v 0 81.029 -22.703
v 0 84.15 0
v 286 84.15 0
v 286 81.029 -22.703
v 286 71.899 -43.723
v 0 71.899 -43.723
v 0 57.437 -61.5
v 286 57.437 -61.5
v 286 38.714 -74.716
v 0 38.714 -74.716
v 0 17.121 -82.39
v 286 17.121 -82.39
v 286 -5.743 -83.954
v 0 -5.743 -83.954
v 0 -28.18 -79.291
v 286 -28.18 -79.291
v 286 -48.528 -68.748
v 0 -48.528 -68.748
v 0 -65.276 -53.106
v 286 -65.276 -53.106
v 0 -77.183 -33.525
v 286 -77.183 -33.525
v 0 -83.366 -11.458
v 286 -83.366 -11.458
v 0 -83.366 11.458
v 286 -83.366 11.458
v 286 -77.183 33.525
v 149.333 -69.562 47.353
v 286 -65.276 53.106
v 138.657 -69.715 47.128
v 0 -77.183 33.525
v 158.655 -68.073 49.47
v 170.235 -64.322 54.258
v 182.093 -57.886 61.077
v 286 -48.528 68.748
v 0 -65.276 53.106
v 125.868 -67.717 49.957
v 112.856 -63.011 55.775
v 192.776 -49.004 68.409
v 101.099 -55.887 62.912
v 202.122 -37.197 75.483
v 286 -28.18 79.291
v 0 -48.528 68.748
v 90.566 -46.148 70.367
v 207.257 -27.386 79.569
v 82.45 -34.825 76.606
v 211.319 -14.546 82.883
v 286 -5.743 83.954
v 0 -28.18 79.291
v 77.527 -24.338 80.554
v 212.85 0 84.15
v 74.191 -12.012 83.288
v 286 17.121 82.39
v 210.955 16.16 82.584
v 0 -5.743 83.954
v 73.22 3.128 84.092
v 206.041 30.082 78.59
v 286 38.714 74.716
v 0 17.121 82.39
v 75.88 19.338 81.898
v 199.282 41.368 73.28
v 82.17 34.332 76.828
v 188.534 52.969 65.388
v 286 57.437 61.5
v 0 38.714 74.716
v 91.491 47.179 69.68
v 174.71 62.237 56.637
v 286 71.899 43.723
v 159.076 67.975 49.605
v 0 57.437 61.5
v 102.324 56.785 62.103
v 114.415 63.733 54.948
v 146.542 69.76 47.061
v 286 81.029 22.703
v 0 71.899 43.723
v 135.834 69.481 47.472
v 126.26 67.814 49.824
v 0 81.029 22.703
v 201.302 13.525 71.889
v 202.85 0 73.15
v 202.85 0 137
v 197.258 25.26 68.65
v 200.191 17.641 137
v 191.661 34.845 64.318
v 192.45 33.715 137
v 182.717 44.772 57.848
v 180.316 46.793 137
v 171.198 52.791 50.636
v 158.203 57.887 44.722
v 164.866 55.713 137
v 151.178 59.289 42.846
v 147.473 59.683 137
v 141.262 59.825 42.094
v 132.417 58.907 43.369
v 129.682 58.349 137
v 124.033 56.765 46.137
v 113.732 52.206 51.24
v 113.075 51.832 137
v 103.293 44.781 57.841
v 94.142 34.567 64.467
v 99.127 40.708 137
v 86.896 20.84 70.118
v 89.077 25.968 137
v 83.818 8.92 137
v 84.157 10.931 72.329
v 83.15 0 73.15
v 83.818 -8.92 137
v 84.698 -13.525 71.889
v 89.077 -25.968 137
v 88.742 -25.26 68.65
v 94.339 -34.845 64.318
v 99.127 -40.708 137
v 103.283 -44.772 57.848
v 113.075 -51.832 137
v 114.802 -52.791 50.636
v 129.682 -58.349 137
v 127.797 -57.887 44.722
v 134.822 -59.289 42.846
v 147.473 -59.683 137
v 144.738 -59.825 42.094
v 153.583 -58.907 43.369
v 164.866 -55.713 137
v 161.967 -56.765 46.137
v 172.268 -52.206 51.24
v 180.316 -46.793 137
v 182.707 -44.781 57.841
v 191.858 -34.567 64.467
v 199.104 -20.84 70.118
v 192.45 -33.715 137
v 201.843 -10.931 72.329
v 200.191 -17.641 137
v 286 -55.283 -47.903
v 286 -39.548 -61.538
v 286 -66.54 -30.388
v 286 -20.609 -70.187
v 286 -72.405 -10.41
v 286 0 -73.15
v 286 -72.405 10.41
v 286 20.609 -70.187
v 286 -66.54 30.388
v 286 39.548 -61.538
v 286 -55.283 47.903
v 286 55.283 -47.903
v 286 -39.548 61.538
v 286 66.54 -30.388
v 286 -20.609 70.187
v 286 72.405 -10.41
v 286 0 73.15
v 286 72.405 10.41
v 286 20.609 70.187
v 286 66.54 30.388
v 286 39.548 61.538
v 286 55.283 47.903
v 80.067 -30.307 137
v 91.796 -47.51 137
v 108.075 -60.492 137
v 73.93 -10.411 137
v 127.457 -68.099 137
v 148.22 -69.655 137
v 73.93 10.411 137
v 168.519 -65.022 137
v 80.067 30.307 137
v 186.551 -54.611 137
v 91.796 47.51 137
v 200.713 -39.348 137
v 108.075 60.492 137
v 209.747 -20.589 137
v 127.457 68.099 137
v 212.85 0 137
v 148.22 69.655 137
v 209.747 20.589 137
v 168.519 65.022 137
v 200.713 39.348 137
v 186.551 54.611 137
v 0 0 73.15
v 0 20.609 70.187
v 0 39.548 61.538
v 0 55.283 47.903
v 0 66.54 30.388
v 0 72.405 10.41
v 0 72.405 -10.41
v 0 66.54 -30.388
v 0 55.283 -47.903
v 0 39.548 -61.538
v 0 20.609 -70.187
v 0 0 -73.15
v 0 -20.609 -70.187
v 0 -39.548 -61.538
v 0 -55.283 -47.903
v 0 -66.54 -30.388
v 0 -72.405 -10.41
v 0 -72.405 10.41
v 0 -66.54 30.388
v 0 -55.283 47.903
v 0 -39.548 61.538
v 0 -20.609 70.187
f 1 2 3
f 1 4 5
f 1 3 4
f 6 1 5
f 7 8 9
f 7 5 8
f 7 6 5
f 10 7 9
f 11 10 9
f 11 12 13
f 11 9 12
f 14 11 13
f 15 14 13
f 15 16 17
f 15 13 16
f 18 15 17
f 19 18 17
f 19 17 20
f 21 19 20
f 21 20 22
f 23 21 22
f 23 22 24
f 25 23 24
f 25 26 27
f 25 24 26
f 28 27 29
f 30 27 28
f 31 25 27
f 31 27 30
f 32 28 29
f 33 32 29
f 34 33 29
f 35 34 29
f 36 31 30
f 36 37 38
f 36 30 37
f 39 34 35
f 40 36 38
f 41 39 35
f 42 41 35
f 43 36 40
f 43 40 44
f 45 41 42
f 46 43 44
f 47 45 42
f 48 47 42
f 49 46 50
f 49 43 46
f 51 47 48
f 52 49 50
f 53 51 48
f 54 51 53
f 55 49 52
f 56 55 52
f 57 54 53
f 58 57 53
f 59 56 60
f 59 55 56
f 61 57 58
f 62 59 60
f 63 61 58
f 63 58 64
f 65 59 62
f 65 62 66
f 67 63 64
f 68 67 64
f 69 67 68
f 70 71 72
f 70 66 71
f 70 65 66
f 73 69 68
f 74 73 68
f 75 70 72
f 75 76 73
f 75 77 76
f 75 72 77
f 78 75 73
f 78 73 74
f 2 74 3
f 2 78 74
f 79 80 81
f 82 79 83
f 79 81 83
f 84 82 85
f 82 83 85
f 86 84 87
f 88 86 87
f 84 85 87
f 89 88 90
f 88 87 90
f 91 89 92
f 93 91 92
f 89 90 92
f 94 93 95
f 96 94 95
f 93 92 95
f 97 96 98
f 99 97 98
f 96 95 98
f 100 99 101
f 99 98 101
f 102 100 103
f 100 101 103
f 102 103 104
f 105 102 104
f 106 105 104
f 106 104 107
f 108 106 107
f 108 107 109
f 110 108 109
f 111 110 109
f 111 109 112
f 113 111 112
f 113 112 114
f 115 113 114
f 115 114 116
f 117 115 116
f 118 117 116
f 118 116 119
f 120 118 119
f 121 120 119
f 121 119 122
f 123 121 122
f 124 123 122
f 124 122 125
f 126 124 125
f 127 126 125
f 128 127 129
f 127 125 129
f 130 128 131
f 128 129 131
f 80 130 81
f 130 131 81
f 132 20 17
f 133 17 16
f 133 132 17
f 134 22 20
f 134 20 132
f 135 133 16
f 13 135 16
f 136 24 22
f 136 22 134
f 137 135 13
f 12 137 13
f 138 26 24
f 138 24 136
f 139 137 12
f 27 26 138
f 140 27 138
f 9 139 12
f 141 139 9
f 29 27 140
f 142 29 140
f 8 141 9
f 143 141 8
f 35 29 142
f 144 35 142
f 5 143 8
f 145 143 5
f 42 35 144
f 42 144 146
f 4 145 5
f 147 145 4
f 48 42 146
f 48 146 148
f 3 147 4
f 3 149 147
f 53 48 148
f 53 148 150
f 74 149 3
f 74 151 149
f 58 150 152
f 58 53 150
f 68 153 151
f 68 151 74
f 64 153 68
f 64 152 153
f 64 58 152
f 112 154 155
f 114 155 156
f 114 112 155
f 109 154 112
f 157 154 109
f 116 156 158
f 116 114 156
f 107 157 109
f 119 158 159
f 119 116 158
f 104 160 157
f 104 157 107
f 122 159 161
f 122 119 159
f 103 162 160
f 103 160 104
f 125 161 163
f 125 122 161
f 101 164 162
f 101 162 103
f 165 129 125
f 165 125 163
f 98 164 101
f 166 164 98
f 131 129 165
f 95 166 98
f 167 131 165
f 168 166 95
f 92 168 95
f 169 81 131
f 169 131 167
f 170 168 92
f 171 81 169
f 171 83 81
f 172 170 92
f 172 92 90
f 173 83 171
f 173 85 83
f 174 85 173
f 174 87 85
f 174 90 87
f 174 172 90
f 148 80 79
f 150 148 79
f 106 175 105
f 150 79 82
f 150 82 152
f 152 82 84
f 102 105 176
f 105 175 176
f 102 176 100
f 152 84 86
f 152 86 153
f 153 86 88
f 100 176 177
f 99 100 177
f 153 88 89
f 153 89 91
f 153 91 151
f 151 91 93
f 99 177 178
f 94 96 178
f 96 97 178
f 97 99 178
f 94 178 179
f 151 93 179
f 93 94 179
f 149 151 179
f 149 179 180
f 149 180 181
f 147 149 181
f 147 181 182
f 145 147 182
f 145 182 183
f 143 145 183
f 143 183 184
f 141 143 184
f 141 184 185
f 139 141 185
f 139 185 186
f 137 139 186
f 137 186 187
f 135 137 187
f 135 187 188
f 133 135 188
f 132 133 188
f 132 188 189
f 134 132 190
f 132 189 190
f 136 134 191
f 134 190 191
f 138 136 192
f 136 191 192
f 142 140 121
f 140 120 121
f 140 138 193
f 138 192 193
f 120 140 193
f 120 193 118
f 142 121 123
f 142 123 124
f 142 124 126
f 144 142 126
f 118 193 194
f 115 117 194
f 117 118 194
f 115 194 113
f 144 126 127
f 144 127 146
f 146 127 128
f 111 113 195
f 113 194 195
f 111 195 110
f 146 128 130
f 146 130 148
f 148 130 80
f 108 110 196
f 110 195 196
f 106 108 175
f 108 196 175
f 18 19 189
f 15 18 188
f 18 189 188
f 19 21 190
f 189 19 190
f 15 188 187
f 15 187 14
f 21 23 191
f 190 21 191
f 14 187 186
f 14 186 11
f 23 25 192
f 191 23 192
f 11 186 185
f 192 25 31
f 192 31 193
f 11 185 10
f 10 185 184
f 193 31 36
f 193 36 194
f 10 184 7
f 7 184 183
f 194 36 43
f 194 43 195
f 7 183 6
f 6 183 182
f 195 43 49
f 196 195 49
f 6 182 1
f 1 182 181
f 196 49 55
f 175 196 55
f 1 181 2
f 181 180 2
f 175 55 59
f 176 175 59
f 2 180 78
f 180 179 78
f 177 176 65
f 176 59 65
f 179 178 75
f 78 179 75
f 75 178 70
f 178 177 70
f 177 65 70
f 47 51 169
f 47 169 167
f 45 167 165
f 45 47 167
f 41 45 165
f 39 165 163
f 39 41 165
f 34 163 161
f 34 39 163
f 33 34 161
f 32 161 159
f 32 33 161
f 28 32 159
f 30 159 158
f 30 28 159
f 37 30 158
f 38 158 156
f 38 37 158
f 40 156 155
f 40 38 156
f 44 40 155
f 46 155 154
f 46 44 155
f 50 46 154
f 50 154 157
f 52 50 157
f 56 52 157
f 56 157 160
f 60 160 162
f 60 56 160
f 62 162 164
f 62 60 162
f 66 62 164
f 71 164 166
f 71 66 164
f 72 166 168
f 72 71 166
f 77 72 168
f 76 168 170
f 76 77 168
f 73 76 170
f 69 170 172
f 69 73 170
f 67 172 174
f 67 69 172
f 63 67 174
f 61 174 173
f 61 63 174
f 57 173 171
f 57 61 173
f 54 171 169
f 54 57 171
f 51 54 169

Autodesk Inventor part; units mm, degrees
ref_plane "YZ Plane" through (0, 0, 0) normal (1, 0, 0) x (0, 1, 0)
ref_plane "XZ Plane" through (0, 0, 0) normal (0, 1, 0) x (-1, 0, 0)
ref_plane "XY Plane" through (0, 0, 0) normal (0, 0, 1) x (1, 0, 0)
sketch "Sketch1" plane through (0, 0, 0) normal (1, 0, 0) x (0, 1, 0)
  circle A0 centre (0, 0) radius 84.15
  dimension "d0" = 168.3
extrude "Extrude1" add sketch "Sketch1" along normal blind 286
sketch "Sketch2" plane through (0, 0, 0) normal (0, 0, 1) x (1, 0, 0)
  line L0 (0, 84.15) -> (0, -84.15) projected
  line L1 (286, 84.15) -> (286, -84.15) projected
  line L2 (0, 0) -> (286, 0) construction
  circle A0 centre (143, 0) radius 69.85
  dimension "d3" = 139.7
extrude "Extrude2" add sketch "Sketch2" along normal blind 137
sketch "Sketch3" plane through (0, 0, 0) normal (-1, 0, 0) x (0, 0, 1)
  circle A0 centre (0, 0) radius 84.15 projected
  circle A1 centre (0, 0) radius 73.15
  dimension "a" = 143
  dimension "d6" = 146.3
extrude "Extrude3" cut sketch "Sketch3" against normal through all contours A1
sketch "Sketch4" plane through (143, 0, 137) normal (0, 0, 1) x (1, 0, 0)
  circle A0 centre (0, 0) radius 69.85 projected
  circle A1 centre (0, 0) radius 59.85
  dimension "d9" = 119.7
extrude "Extrude4" cut sketch "Sketch4" against normal up to next contours A1
equation "\"d0\" = D1"
equation "\"d1\" = 2 * a"
equation "\"d3\" = D2"
equation "\"d4\" = b"
equation "\"a\" = 143"
equation "\"d6\" = D1 - 2 * s1"
equation "\"d7\" = a"
equation "\"d9\" = D2 - 2 * s2"
equation "\"d10\" = a"
equation "\"D1\" = 168.3"
equation "\"s1\" = 11"
equation "\"D2\" = 139.7"
equation "\"b\" = 137"
equation "\"Size_Designation\" = 1.2345"
equation "\"s2\" = 10"
properties part number "DIN 2615-1 Reducing Tee 168.3 x 11 - 139.7 x 10 S" material "Steel"
